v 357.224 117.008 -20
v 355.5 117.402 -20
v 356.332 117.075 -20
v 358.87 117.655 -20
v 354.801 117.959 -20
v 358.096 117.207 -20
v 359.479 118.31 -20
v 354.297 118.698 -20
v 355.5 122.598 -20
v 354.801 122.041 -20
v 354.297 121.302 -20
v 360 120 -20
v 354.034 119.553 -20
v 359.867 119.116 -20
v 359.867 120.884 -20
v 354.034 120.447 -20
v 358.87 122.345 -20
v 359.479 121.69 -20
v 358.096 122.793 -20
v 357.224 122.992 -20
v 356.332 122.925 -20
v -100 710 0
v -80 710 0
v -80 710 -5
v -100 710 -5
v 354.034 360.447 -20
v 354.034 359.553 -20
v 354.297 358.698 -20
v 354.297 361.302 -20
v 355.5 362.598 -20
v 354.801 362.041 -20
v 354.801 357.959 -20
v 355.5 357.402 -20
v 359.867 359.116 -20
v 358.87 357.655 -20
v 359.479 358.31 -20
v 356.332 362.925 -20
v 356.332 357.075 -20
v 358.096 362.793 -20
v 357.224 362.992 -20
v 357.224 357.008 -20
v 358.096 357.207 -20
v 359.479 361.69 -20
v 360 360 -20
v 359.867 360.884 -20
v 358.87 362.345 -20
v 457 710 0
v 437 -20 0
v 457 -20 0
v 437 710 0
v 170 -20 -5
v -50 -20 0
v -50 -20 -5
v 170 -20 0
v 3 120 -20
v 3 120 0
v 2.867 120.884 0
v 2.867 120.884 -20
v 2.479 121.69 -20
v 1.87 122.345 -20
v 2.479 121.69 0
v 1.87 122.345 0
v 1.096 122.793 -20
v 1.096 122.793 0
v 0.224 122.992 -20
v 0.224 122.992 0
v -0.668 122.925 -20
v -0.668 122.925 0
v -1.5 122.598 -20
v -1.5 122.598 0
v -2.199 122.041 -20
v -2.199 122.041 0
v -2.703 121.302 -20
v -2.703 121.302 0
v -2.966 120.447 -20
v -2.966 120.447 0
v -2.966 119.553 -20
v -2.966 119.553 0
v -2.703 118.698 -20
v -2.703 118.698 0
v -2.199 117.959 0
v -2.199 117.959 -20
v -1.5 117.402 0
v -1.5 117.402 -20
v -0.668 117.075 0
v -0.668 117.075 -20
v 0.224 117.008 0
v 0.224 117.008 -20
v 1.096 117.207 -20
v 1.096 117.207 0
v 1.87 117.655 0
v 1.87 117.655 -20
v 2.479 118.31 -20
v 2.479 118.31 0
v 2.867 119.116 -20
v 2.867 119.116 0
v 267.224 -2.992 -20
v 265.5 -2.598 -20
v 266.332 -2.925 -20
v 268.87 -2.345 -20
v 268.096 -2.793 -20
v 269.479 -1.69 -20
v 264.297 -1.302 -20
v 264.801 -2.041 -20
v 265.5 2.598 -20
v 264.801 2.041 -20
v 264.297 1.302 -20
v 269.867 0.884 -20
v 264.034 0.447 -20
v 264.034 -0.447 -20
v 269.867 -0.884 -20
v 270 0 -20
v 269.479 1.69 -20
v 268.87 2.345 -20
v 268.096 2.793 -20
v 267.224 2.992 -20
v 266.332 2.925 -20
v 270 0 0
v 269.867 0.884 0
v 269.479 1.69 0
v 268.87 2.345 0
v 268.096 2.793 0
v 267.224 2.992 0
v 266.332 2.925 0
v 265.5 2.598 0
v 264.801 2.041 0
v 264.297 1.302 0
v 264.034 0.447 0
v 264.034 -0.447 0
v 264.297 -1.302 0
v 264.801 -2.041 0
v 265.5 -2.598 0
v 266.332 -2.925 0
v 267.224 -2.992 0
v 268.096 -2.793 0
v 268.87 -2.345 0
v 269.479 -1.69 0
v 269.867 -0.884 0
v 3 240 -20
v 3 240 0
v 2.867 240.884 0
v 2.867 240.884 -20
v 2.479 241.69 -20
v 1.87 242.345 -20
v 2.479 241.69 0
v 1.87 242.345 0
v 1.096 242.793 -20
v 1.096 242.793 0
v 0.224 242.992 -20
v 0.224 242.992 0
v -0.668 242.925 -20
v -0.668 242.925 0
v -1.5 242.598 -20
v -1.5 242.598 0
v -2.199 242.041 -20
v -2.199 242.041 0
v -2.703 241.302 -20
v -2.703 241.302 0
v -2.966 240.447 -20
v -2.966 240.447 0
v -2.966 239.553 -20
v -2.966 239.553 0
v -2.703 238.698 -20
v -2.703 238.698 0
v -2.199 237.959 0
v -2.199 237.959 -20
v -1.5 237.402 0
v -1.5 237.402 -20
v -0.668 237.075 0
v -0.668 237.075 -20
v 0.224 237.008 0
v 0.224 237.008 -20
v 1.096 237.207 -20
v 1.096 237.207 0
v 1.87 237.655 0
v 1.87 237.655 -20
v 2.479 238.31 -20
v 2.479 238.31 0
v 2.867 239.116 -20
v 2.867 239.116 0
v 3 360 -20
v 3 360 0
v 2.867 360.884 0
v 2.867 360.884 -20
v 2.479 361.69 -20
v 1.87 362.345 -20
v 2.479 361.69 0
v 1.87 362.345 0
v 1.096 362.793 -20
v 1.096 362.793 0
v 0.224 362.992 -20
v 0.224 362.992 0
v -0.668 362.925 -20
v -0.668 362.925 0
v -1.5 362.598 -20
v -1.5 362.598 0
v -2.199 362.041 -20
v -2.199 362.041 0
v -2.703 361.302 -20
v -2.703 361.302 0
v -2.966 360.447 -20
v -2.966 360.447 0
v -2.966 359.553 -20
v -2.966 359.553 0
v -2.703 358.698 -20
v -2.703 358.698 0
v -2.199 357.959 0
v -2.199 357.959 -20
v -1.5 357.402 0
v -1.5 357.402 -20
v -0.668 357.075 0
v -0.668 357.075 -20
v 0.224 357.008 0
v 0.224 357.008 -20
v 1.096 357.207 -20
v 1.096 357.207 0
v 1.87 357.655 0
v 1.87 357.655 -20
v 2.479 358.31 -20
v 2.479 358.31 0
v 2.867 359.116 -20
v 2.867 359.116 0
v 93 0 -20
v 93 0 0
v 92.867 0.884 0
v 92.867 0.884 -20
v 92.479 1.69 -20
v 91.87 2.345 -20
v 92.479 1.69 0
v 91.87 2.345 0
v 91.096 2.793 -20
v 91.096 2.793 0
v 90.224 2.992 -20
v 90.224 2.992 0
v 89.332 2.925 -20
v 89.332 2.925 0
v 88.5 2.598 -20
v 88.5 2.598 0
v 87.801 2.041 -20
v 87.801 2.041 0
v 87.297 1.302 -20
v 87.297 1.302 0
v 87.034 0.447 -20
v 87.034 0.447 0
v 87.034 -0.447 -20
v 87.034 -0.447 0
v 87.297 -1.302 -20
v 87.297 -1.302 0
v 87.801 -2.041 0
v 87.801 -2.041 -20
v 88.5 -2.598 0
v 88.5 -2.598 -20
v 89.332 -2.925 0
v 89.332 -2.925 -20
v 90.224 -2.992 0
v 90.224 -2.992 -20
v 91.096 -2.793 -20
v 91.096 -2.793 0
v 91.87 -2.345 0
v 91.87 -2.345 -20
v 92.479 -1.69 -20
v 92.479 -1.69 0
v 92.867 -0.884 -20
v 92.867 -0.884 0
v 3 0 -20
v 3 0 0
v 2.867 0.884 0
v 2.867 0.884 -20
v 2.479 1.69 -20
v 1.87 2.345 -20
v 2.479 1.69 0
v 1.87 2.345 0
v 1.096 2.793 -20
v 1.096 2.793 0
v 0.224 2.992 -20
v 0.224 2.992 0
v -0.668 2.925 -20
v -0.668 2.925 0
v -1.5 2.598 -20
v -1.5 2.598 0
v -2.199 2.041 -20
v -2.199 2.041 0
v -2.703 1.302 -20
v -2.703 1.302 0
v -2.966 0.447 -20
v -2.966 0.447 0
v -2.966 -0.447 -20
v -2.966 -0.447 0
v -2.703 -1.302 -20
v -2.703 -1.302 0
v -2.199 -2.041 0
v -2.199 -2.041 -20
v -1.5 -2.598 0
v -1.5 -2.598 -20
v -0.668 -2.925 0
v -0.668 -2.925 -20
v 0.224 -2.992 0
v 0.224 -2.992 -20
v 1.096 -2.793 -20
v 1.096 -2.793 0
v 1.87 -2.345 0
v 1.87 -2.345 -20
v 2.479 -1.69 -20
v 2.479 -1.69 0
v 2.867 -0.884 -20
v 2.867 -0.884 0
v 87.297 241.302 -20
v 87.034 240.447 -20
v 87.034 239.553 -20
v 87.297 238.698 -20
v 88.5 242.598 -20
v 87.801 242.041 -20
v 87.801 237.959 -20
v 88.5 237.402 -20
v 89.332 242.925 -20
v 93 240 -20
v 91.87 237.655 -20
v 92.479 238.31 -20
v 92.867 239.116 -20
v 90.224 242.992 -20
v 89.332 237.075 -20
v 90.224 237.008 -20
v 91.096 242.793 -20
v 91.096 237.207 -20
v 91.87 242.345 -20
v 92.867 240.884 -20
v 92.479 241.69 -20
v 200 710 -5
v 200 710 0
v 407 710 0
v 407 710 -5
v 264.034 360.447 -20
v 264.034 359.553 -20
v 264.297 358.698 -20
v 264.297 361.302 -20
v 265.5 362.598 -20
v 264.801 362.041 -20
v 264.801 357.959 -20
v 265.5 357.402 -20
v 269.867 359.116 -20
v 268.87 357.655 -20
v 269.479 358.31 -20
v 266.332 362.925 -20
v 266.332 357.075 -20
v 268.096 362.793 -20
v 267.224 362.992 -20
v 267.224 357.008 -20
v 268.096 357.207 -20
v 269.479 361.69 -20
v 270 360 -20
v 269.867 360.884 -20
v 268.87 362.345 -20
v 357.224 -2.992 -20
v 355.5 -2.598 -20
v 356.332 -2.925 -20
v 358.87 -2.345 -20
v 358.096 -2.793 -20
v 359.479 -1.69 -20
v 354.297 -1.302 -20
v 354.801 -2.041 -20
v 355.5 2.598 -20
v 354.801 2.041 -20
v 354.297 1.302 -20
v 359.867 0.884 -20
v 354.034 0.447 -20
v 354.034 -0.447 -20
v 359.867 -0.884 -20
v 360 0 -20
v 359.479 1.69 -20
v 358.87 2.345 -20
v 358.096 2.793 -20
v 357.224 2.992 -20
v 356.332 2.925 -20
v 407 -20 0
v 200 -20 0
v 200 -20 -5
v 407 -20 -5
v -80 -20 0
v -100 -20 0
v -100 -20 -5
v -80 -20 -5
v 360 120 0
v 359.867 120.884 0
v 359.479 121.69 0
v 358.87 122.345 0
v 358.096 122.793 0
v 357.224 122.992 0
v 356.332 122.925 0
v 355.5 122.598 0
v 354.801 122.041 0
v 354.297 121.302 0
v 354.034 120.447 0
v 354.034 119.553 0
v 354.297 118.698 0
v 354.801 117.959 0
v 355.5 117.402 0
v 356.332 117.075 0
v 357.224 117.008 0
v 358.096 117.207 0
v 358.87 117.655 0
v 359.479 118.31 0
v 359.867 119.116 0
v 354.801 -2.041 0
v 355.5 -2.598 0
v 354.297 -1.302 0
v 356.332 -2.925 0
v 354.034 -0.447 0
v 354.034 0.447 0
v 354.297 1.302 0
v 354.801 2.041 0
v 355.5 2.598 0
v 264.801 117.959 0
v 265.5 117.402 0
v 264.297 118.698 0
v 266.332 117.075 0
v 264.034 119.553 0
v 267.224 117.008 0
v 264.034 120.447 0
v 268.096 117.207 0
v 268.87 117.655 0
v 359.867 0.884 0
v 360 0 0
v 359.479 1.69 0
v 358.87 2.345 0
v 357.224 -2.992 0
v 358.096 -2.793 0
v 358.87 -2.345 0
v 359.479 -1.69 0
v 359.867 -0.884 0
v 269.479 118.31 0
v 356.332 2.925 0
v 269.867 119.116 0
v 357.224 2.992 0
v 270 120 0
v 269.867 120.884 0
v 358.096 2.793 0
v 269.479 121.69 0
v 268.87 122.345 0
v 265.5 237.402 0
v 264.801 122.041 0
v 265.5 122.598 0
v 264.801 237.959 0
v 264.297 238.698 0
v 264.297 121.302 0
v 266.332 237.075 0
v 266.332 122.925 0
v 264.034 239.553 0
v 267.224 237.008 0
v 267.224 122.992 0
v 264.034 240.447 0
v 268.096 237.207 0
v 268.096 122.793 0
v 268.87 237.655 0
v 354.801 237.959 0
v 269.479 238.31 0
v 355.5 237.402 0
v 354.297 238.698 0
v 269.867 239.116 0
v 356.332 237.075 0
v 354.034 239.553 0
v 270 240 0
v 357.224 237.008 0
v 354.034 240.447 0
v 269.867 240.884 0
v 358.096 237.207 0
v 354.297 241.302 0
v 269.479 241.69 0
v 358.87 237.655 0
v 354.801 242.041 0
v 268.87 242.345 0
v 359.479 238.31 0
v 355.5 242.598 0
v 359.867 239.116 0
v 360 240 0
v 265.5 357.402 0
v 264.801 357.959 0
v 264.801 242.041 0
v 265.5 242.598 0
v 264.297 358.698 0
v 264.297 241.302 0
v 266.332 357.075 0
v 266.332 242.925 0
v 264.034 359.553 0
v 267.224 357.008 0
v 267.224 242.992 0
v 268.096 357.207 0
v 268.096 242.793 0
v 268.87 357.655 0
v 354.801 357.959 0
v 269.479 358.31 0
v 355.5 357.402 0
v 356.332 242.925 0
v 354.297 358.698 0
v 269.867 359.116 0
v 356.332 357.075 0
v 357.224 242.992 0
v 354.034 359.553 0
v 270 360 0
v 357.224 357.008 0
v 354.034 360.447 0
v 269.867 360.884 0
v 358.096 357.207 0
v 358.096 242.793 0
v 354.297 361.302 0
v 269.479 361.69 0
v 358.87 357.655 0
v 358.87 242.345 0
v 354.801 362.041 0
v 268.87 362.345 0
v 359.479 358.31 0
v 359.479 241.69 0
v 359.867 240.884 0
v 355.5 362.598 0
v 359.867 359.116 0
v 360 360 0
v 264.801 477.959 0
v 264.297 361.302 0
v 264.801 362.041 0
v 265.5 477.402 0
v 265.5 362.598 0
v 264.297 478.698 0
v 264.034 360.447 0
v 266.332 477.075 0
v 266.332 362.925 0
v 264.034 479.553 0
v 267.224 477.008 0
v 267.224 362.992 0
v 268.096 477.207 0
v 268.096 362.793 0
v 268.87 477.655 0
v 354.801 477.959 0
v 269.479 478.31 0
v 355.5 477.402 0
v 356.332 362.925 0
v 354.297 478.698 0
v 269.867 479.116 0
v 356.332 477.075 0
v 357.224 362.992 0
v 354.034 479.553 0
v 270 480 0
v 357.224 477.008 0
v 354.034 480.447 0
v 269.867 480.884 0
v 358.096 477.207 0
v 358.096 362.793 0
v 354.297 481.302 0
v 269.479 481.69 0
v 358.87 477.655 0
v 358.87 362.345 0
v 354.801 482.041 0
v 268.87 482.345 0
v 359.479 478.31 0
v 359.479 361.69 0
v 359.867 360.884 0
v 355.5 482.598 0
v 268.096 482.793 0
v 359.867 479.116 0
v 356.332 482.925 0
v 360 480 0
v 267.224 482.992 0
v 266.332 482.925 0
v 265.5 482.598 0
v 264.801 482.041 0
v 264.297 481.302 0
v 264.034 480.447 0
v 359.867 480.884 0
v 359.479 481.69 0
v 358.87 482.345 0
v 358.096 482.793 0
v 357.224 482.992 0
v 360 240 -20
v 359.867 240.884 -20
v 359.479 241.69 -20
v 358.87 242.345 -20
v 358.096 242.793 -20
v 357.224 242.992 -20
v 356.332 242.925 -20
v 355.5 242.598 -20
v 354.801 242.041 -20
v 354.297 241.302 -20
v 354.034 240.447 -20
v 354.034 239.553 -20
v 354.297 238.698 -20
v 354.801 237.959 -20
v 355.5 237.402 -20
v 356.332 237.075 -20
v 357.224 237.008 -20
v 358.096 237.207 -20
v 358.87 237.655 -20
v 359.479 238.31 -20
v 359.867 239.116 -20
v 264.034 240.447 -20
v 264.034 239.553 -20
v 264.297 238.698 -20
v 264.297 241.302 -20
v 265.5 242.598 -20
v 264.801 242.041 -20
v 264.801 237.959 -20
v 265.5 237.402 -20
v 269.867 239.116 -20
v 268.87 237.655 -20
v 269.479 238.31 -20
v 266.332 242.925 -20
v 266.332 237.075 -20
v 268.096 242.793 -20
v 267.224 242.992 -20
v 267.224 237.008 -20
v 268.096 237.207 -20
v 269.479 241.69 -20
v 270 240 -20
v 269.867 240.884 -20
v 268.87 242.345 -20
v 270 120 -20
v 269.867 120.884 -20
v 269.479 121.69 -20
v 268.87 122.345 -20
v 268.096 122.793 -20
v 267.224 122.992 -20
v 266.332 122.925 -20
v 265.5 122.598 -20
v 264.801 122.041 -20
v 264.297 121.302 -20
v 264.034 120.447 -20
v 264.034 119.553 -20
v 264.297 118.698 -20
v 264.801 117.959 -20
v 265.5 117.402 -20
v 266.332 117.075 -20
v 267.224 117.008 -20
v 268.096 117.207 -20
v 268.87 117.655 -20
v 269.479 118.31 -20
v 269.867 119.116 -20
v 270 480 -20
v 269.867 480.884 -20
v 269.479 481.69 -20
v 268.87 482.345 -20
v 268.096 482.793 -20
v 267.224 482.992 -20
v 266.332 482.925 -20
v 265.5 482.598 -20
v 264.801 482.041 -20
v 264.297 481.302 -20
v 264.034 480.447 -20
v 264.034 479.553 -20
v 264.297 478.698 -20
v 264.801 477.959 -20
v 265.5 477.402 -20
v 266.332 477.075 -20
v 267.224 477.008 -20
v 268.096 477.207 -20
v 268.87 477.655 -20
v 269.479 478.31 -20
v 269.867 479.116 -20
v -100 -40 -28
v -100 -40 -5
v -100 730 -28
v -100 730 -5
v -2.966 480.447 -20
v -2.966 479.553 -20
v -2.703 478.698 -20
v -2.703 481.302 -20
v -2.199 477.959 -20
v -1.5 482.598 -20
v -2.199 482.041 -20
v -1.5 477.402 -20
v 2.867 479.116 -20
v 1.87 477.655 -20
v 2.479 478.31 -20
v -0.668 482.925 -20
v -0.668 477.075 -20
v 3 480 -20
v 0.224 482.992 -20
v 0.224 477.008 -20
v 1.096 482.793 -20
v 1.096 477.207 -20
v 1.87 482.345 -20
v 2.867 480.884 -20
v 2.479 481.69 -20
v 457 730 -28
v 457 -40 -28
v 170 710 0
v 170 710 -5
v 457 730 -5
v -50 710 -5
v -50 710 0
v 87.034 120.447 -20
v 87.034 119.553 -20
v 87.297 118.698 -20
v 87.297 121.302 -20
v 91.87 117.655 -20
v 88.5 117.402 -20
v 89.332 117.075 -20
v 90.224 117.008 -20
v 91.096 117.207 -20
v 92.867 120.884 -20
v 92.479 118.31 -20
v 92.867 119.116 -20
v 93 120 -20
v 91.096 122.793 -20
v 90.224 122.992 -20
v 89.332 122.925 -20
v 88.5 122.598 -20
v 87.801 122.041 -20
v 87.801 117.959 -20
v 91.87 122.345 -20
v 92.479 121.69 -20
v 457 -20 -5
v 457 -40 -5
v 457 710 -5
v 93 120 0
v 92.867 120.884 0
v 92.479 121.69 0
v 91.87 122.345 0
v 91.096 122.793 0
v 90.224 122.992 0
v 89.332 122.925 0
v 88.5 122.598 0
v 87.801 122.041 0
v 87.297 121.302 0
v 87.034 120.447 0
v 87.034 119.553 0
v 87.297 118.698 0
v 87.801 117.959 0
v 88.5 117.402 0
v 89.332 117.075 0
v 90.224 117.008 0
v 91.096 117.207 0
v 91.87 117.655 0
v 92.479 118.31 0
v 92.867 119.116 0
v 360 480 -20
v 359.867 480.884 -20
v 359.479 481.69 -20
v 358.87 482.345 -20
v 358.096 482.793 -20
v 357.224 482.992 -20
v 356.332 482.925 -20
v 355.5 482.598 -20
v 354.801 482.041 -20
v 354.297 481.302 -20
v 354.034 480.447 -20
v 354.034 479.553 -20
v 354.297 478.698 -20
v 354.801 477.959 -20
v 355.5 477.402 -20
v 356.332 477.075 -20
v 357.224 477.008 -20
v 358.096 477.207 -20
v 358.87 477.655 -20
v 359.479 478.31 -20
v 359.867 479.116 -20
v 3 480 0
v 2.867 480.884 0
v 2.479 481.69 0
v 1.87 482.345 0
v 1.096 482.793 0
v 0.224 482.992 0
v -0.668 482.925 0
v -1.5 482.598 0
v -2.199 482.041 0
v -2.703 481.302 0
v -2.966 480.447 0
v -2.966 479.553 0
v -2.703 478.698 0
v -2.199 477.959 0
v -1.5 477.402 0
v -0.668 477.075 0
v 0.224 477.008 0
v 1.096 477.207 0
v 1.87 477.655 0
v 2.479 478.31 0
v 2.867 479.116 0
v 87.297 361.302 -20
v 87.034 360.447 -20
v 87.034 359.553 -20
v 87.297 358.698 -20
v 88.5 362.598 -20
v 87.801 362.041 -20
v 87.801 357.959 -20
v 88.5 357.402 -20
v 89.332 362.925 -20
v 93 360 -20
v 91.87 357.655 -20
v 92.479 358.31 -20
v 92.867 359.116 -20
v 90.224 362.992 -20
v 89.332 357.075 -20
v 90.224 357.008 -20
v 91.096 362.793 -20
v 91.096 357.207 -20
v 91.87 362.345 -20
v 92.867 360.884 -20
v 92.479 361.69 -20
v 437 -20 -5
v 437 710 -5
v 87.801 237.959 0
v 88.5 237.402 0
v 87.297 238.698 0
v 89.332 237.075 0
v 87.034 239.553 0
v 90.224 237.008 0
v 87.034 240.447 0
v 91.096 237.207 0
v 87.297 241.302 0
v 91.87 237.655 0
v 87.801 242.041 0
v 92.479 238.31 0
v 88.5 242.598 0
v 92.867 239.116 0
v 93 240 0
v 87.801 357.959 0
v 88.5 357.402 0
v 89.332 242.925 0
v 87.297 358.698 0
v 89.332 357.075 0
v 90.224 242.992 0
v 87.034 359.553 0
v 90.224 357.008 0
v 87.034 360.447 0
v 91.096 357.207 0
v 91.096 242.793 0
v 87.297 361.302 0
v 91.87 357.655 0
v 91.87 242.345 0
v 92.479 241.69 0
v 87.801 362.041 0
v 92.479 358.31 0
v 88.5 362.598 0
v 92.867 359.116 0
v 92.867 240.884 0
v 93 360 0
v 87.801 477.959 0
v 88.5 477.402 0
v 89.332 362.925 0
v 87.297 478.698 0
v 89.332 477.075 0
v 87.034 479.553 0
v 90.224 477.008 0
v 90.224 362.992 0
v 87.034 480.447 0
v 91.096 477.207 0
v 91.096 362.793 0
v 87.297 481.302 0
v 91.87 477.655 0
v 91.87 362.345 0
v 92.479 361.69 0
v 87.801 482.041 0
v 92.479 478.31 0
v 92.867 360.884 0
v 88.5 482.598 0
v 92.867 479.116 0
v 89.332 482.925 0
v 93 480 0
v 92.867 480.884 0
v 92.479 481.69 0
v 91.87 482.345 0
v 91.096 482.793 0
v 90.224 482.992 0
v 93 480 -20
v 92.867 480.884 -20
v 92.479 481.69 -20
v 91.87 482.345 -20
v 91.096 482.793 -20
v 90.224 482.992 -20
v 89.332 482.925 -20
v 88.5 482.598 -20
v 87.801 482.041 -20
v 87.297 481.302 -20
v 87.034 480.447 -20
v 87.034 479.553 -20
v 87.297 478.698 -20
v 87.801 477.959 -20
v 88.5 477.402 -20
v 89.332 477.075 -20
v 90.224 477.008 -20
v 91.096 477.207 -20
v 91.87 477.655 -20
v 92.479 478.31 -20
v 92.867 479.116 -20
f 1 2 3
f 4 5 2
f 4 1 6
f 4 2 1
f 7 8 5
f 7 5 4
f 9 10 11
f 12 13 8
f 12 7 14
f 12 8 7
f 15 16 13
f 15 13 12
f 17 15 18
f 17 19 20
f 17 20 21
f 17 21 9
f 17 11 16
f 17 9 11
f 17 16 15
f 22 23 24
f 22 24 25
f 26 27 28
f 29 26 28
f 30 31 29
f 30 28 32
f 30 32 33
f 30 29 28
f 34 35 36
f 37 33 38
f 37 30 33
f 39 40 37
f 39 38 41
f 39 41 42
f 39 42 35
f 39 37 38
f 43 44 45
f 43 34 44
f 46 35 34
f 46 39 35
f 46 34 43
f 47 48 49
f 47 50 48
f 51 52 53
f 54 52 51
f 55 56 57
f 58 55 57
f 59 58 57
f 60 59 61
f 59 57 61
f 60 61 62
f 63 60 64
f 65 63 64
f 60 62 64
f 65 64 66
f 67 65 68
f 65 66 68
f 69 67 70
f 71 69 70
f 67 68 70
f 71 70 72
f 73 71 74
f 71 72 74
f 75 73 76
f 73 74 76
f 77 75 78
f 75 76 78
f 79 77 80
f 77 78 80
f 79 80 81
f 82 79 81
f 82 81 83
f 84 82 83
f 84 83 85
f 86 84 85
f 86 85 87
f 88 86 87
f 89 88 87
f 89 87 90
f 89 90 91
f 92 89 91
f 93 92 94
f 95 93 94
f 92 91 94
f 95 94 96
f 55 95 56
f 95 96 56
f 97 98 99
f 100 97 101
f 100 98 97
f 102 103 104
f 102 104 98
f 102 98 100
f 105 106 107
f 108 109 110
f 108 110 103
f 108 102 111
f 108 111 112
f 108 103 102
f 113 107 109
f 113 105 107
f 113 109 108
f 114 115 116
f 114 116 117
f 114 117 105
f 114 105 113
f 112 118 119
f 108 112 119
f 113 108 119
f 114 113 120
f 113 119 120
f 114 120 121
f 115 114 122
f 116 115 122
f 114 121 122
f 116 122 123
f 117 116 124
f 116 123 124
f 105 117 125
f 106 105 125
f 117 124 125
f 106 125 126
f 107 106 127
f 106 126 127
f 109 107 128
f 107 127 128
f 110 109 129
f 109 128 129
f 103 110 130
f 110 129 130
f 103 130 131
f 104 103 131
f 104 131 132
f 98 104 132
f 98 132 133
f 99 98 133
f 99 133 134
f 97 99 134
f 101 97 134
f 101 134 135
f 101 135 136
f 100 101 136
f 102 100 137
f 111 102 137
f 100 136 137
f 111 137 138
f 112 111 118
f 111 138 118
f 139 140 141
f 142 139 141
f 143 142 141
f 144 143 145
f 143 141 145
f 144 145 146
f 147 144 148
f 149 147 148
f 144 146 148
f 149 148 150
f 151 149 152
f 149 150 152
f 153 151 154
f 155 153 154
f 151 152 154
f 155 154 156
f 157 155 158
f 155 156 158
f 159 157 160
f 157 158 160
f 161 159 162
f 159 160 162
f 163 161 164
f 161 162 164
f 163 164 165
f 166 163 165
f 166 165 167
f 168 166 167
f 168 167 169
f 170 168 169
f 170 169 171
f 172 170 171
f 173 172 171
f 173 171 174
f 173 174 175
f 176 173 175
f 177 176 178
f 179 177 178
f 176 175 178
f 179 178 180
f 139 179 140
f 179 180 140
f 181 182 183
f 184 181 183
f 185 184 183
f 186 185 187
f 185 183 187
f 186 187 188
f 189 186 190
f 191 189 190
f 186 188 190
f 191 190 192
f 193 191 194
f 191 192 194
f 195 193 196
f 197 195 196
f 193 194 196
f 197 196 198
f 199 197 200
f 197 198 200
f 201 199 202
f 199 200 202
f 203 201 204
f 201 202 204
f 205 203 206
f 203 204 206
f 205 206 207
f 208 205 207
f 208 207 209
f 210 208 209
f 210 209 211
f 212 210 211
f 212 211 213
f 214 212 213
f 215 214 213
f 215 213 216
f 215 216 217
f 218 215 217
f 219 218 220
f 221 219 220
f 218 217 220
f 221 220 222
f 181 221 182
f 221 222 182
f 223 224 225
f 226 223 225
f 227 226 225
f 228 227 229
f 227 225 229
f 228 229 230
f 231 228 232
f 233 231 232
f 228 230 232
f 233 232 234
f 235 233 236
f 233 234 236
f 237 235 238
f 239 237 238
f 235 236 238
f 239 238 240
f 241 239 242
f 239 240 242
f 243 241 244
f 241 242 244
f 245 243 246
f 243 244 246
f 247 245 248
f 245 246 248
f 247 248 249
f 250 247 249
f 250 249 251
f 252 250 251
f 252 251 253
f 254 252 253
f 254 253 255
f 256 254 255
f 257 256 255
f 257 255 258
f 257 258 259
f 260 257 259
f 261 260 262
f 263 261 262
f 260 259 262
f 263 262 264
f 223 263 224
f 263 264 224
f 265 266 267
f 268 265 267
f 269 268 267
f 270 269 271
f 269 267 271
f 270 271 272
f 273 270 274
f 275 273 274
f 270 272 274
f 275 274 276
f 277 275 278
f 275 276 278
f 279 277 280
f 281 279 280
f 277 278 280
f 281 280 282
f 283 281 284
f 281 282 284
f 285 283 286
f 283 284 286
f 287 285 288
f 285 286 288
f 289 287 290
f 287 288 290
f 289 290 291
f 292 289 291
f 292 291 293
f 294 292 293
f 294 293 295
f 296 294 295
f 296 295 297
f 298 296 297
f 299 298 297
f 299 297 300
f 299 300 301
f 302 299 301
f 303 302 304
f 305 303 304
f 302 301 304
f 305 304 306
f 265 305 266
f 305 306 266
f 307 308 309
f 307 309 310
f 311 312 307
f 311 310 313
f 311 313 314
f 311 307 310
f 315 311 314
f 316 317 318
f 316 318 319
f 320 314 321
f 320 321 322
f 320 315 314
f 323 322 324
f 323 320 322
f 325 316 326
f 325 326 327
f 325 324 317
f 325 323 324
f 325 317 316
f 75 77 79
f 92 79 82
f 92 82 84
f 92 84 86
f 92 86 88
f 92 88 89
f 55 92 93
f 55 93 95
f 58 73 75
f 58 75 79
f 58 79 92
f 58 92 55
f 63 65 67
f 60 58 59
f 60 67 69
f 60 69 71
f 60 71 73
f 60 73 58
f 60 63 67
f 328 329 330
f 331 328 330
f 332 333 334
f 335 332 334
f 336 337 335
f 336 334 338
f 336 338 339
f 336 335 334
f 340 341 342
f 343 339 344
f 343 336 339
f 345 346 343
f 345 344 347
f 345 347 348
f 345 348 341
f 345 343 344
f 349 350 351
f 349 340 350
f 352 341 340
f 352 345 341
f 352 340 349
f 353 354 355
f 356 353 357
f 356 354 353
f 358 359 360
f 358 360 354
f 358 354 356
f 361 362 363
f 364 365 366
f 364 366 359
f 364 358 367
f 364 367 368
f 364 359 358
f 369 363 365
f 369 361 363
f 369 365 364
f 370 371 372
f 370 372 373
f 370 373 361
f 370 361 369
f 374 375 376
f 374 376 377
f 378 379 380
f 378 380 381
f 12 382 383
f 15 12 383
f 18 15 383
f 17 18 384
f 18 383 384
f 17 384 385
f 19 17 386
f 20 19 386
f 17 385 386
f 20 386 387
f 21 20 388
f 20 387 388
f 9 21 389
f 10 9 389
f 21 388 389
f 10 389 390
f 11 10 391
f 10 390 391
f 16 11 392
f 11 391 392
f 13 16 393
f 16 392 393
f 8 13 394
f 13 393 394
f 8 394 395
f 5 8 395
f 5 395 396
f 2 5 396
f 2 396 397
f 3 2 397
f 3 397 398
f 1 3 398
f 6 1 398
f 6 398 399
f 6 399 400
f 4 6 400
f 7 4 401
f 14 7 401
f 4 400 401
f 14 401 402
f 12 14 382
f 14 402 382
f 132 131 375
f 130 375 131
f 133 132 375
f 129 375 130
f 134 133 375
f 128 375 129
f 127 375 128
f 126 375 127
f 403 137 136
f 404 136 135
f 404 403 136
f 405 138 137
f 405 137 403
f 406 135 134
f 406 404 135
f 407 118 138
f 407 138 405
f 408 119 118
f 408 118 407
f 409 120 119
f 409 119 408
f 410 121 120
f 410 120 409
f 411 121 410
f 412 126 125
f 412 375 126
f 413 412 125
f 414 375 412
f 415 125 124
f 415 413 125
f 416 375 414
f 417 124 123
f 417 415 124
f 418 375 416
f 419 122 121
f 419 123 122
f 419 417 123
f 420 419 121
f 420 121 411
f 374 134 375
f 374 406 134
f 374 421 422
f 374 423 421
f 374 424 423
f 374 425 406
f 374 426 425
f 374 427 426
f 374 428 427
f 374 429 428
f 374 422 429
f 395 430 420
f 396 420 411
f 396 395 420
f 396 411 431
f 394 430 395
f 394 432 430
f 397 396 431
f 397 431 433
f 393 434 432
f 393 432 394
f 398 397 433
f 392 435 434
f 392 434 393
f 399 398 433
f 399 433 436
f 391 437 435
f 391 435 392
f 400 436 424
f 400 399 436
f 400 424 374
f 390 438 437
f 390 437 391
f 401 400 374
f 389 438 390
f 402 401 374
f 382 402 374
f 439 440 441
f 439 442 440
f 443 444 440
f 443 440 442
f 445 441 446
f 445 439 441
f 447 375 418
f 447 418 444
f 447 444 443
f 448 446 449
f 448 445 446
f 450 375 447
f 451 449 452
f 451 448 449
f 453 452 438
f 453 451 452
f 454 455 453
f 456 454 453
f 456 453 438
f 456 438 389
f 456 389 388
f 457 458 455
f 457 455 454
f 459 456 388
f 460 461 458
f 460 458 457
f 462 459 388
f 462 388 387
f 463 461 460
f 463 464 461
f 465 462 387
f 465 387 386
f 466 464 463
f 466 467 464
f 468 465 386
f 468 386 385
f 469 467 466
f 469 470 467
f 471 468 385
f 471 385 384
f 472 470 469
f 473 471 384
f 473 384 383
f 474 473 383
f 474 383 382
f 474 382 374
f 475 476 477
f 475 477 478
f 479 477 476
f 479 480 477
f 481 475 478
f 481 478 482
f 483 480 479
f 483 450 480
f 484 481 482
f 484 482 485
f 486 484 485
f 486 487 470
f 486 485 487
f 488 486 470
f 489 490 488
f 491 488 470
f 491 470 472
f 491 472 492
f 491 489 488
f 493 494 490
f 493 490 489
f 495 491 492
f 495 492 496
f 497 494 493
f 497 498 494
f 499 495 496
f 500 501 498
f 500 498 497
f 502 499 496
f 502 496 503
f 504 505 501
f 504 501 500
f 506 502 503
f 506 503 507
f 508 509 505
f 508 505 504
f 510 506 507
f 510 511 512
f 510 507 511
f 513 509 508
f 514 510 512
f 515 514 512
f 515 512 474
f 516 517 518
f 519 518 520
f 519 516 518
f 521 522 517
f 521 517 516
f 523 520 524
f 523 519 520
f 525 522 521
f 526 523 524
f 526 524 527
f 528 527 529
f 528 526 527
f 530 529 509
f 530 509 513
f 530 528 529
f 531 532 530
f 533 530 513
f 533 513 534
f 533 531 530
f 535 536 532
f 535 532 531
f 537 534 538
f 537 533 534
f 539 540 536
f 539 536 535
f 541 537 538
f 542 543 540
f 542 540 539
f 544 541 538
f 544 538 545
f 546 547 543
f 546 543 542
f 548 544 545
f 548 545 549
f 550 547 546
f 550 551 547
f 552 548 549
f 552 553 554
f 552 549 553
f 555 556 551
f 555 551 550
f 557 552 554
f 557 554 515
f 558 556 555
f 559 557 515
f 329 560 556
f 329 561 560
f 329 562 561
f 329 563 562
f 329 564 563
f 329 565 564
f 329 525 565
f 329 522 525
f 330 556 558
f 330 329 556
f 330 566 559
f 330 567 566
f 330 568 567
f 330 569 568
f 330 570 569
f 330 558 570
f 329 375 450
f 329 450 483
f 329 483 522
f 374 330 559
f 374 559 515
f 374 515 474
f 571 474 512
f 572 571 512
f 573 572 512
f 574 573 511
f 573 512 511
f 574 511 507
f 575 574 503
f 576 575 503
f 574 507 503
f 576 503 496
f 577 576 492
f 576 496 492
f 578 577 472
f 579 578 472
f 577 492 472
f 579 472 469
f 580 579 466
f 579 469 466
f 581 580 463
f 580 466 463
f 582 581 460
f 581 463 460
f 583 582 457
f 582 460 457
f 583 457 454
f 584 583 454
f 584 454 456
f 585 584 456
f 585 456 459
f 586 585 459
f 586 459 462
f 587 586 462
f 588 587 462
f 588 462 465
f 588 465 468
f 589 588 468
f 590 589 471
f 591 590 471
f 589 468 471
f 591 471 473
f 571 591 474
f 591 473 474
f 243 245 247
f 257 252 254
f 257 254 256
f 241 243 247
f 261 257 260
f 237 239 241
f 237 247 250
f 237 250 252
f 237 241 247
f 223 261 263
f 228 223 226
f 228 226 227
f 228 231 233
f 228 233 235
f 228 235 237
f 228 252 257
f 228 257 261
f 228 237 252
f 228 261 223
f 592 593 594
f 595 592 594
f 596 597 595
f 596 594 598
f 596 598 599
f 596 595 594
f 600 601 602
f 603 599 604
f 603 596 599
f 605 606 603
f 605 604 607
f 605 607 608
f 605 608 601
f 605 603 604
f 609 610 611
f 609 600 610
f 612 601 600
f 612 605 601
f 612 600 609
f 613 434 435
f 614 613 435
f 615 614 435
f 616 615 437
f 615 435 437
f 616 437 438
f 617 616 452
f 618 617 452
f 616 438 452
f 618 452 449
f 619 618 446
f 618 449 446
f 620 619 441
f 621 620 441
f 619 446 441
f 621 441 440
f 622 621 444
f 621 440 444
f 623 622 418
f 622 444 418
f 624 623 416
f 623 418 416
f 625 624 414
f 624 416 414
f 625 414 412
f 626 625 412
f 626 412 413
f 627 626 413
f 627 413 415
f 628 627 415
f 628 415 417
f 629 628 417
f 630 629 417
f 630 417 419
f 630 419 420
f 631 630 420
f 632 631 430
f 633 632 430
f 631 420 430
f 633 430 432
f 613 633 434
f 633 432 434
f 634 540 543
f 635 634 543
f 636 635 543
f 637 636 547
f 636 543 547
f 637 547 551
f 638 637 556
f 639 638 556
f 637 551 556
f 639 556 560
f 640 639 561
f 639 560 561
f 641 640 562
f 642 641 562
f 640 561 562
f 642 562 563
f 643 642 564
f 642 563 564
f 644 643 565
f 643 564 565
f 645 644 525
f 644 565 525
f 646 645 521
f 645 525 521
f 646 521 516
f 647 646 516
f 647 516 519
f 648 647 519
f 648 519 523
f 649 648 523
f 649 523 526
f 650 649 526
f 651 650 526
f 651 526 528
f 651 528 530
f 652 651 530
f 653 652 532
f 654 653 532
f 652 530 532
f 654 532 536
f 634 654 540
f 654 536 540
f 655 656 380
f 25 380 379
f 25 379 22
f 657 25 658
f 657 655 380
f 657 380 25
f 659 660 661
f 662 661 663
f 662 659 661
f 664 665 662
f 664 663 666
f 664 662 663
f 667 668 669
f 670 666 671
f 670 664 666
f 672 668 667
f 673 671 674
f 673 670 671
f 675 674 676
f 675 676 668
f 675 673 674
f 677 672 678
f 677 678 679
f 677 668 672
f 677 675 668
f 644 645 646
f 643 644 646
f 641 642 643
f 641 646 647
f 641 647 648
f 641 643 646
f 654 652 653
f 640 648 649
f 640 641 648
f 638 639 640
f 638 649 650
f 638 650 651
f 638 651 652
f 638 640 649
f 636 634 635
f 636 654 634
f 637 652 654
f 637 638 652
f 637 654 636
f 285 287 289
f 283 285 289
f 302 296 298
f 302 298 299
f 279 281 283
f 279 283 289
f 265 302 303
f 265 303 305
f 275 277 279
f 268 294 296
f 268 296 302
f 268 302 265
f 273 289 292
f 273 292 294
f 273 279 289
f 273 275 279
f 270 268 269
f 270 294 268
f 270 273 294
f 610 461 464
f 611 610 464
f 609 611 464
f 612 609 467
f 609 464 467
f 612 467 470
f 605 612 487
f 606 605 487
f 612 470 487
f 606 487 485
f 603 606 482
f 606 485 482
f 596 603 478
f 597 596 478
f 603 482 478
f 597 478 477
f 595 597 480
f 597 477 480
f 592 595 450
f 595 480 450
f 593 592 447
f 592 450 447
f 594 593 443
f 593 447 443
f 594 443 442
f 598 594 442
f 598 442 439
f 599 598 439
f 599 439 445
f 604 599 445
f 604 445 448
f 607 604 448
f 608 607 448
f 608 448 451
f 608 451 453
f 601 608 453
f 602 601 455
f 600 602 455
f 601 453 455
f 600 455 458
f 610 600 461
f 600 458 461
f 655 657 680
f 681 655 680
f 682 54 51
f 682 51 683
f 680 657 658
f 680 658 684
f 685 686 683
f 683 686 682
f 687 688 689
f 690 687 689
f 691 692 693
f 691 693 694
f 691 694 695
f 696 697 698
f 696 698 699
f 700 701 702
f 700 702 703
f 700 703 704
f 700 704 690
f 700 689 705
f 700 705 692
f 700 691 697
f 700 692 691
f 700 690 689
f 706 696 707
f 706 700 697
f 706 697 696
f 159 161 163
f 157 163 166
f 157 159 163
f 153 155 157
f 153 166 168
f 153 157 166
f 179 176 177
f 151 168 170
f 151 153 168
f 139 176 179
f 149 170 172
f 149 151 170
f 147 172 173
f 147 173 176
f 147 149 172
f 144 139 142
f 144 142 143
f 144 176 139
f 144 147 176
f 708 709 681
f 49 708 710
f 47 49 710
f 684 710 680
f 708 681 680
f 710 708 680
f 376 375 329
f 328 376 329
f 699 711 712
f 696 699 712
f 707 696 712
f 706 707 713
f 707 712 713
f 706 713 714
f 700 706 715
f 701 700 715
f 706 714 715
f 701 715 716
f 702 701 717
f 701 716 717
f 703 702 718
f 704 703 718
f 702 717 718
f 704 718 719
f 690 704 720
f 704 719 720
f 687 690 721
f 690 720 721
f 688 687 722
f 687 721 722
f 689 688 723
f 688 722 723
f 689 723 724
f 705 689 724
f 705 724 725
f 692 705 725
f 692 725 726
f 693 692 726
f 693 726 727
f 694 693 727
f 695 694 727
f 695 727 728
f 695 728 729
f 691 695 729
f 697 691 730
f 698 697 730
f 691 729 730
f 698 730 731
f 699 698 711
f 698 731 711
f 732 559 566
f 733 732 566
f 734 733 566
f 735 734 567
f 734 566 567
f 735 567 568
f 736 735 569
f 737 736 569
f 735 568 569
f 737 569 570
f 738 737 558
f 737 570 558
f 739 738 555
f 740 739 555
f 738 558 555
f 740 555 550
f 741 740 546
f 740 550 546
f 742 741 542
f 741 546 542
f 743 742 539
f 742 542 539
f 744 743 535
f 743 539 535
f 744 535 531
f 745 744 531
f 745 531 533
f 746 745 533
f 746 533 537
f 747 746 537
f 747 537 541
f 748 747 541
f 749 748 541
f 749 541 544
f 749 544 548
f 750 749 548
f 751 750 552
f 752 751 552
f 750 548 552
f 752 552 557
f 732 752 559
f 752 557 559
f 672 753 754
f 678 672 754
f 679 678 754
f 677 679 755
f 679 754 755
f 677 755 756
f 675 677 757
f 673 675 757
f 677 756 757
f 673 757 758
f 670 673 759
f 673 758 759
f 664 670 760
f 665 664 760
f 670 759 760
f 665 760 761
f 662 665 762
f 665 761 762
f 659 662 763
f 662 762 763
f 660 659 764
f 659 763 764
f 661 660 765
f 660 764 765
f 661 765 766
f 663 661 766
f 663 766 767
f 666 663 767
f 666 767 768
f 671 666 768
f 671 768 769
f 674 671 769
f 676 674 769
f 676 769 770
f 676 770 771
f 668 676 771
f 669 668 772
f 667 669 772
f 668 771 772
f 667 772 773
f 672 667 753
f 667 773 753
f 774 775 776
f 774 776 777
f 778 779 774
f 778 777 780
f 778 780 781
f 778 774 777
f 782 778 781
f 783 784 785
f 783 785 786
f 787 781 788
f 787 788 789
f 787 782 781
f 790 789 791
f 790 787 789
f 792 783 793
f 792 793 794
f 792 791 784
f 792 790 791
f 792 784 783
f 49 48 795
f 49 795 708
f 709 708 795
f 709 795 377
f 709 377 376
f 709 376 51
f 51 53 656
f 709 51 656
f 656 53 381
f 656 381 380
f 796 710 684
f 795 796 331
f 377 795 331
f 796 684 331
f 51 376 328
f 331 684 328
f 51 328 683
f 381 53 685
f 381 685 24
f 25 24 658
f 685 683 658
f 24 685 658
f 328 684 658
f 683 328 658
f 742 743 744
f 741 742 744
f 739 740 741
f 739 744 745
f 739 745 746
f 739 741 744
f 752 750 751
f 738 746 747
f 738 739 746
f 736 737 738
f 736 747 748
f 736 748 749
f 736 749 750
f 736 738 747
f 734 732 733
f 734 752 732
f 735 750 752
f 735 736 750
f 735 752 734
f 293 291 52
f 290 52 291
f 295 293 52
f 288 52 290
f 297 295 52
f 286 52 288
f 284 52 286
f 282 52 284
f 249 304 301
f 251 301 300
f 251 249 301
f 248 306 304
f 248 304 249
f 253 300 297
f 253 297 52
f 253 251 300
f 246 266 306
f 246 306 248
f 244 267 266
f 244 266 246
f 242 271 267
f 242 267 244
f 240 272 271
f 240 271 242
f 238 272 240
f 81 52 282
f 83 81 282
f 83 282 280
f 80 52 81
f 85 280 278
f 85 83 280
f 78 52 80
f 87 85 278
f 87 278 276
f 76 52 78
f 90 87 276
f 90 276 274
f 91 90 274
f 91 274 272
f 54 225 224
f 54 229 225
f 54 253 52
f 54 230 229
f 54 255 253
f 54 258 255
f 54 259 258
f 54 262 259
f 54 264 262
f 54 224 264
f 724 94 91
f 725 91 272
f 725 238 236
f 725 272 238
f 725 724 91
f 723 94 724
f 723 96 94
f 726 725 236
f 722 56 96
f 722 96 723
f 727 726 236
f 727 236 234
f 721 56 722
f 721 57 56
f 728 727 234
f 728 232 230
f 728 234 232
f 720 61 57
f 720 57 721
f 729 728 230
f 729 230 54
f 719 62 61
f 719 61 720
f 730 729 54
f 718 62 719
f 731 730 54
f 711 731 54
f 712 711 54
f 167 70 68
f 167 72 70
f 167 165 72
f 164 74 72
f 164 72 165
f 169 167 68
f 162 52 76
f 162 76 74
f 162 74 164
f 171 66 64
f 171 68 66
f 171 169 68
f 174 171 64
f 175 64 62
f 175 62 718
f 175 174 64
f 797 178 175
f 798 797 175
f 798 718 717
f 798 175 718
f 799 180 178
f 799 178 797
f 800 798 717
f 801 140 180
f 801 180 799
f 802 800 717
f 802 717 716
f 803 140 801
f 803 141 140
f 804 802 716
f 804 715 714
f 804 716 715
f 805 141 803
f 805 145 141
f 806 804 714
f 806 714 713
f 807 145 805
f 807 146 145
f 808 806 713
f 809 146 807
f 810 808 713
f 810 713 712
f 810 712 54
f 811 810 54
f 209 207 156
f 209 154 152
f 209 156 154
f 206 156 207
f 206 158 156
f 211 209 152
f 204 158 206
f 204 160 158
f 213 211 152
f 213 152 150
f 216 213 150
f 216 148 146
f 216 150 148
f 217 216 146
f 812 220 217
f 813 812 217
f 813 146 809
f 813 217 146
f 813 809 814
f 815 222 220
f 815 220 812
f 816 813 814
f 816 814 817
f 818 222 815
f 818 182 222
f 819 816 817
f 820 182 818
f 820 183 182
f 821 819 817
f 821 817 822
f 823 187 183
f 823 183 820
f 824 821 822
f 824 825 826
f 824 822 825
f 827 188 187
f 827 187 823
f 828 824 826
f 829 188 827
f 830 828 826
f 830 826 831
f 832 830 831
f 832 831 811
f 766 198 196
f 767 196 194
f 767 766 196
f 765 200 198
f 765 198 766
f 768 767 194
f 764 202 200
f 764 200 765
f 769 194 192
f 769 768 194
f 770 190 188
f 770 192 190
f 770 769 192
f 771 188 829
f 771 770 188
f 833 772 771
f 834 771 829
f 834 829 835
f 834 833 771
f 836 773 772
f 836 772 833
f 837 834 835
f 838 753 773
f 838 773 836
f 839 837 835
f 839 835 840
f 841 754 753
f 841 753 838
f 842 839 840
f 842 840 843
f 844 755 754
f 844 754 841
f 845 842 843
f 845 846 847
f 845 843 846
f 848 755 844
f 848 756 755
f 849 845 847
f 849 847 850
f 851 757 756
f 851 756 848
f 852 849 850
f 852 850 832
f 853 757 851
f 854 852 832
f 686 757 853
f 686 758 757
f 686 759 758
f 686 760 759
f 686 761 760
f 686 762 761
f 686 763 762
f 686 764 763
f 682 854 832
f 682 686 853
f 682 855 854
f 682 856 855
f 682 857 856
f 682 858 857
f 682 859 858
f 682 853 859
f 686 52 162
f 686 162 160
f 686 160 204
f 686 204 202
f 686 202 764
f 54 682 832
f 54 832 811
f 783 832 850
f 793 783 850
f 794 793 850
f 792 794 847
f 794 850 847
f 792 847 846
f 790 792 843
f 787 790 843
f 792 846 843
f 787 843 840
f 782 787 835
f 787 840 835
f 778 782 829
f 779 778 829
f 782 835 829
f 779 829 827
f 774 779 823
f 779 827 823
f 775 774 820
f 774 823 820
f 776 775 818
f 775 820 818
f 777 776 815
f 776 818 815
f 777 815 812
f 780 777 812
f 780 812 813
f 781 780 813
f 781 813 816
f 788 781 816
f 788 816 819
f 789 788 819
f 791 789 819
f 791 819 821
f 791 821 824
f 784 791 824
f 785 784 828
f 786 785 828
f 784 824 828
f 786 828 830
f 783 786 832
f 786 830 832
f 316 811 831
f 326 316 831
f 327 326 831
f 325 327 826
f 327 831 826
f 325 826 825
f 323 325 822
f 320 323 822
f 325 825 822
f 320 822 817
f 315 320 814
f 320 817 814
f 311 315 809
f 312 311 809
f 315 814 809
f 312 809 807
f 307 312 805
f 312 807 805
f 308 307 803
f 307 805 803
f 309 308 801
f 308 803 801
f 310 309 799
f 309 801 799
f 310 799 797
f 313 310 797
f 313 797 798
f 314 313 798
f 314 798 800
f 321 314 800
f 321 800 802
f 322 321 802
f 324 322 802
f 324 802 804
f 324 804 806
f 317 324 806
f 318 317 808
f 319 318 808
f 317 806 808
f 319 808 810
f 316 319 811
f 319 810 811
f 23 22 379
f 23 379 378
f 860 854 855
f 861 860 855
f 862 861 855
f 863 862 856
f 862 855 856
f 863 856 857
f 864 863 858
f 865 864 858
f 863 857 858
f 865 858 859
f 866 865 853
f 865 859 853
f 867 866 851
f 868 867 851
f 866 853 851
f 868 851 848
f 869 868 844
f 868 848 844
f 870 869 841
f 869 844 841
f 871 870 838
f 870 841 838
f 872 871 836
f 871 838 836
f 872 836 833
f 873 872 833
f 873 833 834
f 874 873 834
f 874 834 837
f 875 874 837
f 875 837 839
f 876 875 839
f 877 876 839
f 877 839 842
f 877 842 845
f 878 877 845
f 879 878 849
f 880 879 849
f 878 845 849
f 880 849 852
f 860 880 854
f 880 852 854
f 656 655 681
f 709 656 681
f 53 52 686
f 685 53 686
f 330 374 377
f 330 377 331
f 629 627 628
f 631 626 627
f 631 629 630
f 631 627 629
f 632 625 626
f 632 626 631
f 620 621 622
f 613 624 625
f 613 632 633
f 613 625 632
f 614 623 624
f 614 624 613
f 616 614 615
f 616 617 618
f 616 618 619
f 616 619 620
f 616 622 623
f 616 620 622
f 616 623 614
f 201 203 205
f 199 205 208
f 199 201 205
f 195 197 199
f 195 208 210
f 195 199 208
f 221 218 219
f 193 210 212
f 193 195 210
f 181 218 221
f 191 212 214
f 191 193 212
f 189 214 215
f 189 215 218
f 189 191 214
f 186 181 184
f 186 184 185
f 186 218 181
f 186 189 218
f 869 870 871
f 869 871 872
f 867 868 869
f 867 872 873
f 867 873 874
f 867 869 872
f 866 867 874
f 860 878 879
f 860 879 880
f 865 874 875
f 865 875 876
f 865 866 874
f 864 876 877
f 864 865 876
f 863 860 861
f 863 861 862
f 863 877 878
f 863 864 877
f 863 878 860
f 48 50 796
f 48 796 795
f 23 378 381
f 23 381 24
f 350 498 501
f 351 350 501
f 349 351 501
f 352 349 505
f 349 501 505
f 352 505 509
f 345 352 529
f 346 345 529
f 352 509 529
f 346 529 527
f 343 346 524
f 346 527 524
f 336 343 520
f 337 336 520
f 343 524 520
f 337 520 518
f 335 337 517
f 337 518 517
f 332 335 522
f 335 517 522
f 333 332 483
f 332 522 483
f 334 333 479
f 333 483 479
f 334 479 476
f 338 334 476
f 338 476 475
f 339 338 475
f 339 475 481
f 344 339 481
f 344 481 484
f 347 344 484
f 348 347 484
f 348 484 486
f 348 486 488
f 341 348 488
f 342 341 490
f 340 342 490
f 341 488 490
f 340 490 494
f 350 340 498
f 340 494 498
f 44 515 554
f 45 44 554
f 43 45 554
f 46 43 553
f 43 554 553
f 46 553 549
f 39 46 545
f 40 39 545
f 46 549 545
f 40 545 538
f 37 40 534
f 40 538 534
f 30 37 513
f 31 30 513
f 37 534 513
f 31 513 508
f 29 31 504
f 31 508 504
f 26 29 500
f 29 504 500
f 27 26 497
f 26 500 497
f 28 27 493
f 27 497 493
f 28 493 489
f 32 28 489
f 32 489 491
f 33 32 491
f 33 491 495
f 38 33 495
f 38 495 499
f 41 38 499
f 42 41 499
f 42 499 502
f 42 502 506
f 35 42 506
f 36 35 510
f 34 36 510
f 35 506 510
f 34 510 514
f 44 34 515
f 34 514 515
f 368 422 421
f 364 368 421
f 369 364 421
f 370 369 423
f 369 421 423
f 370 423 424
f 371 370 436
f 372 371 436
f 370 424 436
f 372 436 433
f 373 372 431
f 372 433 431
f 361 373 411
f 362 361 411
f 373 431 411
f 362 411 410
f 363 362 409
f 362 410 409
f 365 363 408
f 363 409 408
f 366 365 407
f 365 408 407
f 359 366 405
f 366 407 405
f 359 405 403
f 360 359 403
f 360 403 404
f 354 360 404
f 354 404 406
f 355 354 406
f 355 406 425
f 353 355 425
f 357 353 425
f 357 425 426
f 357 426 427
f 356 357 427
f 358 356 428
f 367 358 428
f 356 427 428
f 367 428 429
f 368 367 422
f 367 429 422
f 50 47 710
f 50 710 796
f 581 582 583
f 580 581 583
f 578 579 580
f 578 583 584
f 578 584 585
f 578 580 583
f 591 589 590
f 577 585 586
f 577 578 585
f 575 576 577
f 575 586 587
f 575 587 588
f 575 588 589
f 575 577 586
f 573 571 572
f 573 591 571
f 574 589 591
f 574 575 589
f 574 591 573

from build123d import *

# Parameters (mm, degrees)
SKETCH_W        = 557
SKETCH_H        = 770
PAD_DEPTH       = 28
SKETCH001_W     = 220
SKETCH001_H     = 730
SKETCH001_W_2   = 207
POCKET_DEPTH    = 5
SKETCH002_R     = 3
POCKET001_DEPTH = 20


with BuildPart() as part:
    # Sketch → Pad (new body)
    with BuildSketch(Plane.XY):
        with Locations((278.5, 385)):
            Rectangle(SKETCH_W, SKETCH_H)
    extrude(amount=PAD_DEPTH)

    # Sketch001 (on Face6 of Pad) → Pocket (cut)
    with BuildSketch(Plane.XY.offset(28)):
        Polygon((0, 770), (557, 770), (557, 750), (537, 750), (537, 20), (557, 20), (557, 0), (0, 0), (0, 20), (20, 20), (20, 750), (0, 750), align=None)
        with Locations((160, 385)):
            Rectangle(SKETCH001_W, SKETCH001_H, mode=Mode.SUBTRACT)
        with Locations((403.5, 385)):
            Rectangle(SKETCH001_W_2, SKETCH001_H, mode=Mode.SUBTRACT)
    extrude(amount=-POCKET_DEPTH, mode=Mode.SUBTRACT)

    # Sketch002 (on Face6 of Pad) → Pocket001 (cut)
    with BuildSketch(Plane.XY.offset(28)):
        with Locations((100, 40)):
            Circle(SKETCH002_R)
        with Locations((190, 40)):
            Circle(SKETCH002_R)
        with Locations((367, 40)):
            Circle(SKETCH002_R)
        with Locations((457, 40)):
            Circle(SKETCH002_R)
        with Locations((100, 160)):
            Circle(SKETCH002_R)
        with Locations((190, 160)):
            Circle(SKETCH002_R)
        with Locations((367, 160)):
            Circle(SKETCH002_R)
        with Locations((457, 160)):
            Circle(SKETCH002_R)
        with Locations((100, 280)):
            Circle(SKETCH002_R)
        with Locations((190, 280)):
            Circle(SKETCH002_R)
        with Locations((367, 280)):
            Circle(SKETCH002_R)
        with Locations((457, 280)):
            Circle(SKETCH002_R)
        with Locations((100, 400)):
            Circle(SKETCH002_R)
        with Locations((190, 400)):
            Circle(SKETCH002_R)
        with Locations((367, 400)):
            Circle(SKETCH002_R)
        with Locations((457, 400)):
            Circle(SKETCH002_R)
        with Locations((100, 520)):
            Circle(SKETCH002_R)
        with Locations((190, 520)):
            Circle(SKETCH002_R)
        with Locations((367, 520)):
            Circle(SKETCH002_R)
        with Locations((457, 520)):
            Circle(SKETCH002_R)
    extrude(amount=-POCKET001_DEPTH, mode=Mode.SUBTRACT)


with BuildPart() as part_1:
    # Clone placement: moved
    add(part.part.moved(Location((-100, -40, -28))))


solid = part_1.part
